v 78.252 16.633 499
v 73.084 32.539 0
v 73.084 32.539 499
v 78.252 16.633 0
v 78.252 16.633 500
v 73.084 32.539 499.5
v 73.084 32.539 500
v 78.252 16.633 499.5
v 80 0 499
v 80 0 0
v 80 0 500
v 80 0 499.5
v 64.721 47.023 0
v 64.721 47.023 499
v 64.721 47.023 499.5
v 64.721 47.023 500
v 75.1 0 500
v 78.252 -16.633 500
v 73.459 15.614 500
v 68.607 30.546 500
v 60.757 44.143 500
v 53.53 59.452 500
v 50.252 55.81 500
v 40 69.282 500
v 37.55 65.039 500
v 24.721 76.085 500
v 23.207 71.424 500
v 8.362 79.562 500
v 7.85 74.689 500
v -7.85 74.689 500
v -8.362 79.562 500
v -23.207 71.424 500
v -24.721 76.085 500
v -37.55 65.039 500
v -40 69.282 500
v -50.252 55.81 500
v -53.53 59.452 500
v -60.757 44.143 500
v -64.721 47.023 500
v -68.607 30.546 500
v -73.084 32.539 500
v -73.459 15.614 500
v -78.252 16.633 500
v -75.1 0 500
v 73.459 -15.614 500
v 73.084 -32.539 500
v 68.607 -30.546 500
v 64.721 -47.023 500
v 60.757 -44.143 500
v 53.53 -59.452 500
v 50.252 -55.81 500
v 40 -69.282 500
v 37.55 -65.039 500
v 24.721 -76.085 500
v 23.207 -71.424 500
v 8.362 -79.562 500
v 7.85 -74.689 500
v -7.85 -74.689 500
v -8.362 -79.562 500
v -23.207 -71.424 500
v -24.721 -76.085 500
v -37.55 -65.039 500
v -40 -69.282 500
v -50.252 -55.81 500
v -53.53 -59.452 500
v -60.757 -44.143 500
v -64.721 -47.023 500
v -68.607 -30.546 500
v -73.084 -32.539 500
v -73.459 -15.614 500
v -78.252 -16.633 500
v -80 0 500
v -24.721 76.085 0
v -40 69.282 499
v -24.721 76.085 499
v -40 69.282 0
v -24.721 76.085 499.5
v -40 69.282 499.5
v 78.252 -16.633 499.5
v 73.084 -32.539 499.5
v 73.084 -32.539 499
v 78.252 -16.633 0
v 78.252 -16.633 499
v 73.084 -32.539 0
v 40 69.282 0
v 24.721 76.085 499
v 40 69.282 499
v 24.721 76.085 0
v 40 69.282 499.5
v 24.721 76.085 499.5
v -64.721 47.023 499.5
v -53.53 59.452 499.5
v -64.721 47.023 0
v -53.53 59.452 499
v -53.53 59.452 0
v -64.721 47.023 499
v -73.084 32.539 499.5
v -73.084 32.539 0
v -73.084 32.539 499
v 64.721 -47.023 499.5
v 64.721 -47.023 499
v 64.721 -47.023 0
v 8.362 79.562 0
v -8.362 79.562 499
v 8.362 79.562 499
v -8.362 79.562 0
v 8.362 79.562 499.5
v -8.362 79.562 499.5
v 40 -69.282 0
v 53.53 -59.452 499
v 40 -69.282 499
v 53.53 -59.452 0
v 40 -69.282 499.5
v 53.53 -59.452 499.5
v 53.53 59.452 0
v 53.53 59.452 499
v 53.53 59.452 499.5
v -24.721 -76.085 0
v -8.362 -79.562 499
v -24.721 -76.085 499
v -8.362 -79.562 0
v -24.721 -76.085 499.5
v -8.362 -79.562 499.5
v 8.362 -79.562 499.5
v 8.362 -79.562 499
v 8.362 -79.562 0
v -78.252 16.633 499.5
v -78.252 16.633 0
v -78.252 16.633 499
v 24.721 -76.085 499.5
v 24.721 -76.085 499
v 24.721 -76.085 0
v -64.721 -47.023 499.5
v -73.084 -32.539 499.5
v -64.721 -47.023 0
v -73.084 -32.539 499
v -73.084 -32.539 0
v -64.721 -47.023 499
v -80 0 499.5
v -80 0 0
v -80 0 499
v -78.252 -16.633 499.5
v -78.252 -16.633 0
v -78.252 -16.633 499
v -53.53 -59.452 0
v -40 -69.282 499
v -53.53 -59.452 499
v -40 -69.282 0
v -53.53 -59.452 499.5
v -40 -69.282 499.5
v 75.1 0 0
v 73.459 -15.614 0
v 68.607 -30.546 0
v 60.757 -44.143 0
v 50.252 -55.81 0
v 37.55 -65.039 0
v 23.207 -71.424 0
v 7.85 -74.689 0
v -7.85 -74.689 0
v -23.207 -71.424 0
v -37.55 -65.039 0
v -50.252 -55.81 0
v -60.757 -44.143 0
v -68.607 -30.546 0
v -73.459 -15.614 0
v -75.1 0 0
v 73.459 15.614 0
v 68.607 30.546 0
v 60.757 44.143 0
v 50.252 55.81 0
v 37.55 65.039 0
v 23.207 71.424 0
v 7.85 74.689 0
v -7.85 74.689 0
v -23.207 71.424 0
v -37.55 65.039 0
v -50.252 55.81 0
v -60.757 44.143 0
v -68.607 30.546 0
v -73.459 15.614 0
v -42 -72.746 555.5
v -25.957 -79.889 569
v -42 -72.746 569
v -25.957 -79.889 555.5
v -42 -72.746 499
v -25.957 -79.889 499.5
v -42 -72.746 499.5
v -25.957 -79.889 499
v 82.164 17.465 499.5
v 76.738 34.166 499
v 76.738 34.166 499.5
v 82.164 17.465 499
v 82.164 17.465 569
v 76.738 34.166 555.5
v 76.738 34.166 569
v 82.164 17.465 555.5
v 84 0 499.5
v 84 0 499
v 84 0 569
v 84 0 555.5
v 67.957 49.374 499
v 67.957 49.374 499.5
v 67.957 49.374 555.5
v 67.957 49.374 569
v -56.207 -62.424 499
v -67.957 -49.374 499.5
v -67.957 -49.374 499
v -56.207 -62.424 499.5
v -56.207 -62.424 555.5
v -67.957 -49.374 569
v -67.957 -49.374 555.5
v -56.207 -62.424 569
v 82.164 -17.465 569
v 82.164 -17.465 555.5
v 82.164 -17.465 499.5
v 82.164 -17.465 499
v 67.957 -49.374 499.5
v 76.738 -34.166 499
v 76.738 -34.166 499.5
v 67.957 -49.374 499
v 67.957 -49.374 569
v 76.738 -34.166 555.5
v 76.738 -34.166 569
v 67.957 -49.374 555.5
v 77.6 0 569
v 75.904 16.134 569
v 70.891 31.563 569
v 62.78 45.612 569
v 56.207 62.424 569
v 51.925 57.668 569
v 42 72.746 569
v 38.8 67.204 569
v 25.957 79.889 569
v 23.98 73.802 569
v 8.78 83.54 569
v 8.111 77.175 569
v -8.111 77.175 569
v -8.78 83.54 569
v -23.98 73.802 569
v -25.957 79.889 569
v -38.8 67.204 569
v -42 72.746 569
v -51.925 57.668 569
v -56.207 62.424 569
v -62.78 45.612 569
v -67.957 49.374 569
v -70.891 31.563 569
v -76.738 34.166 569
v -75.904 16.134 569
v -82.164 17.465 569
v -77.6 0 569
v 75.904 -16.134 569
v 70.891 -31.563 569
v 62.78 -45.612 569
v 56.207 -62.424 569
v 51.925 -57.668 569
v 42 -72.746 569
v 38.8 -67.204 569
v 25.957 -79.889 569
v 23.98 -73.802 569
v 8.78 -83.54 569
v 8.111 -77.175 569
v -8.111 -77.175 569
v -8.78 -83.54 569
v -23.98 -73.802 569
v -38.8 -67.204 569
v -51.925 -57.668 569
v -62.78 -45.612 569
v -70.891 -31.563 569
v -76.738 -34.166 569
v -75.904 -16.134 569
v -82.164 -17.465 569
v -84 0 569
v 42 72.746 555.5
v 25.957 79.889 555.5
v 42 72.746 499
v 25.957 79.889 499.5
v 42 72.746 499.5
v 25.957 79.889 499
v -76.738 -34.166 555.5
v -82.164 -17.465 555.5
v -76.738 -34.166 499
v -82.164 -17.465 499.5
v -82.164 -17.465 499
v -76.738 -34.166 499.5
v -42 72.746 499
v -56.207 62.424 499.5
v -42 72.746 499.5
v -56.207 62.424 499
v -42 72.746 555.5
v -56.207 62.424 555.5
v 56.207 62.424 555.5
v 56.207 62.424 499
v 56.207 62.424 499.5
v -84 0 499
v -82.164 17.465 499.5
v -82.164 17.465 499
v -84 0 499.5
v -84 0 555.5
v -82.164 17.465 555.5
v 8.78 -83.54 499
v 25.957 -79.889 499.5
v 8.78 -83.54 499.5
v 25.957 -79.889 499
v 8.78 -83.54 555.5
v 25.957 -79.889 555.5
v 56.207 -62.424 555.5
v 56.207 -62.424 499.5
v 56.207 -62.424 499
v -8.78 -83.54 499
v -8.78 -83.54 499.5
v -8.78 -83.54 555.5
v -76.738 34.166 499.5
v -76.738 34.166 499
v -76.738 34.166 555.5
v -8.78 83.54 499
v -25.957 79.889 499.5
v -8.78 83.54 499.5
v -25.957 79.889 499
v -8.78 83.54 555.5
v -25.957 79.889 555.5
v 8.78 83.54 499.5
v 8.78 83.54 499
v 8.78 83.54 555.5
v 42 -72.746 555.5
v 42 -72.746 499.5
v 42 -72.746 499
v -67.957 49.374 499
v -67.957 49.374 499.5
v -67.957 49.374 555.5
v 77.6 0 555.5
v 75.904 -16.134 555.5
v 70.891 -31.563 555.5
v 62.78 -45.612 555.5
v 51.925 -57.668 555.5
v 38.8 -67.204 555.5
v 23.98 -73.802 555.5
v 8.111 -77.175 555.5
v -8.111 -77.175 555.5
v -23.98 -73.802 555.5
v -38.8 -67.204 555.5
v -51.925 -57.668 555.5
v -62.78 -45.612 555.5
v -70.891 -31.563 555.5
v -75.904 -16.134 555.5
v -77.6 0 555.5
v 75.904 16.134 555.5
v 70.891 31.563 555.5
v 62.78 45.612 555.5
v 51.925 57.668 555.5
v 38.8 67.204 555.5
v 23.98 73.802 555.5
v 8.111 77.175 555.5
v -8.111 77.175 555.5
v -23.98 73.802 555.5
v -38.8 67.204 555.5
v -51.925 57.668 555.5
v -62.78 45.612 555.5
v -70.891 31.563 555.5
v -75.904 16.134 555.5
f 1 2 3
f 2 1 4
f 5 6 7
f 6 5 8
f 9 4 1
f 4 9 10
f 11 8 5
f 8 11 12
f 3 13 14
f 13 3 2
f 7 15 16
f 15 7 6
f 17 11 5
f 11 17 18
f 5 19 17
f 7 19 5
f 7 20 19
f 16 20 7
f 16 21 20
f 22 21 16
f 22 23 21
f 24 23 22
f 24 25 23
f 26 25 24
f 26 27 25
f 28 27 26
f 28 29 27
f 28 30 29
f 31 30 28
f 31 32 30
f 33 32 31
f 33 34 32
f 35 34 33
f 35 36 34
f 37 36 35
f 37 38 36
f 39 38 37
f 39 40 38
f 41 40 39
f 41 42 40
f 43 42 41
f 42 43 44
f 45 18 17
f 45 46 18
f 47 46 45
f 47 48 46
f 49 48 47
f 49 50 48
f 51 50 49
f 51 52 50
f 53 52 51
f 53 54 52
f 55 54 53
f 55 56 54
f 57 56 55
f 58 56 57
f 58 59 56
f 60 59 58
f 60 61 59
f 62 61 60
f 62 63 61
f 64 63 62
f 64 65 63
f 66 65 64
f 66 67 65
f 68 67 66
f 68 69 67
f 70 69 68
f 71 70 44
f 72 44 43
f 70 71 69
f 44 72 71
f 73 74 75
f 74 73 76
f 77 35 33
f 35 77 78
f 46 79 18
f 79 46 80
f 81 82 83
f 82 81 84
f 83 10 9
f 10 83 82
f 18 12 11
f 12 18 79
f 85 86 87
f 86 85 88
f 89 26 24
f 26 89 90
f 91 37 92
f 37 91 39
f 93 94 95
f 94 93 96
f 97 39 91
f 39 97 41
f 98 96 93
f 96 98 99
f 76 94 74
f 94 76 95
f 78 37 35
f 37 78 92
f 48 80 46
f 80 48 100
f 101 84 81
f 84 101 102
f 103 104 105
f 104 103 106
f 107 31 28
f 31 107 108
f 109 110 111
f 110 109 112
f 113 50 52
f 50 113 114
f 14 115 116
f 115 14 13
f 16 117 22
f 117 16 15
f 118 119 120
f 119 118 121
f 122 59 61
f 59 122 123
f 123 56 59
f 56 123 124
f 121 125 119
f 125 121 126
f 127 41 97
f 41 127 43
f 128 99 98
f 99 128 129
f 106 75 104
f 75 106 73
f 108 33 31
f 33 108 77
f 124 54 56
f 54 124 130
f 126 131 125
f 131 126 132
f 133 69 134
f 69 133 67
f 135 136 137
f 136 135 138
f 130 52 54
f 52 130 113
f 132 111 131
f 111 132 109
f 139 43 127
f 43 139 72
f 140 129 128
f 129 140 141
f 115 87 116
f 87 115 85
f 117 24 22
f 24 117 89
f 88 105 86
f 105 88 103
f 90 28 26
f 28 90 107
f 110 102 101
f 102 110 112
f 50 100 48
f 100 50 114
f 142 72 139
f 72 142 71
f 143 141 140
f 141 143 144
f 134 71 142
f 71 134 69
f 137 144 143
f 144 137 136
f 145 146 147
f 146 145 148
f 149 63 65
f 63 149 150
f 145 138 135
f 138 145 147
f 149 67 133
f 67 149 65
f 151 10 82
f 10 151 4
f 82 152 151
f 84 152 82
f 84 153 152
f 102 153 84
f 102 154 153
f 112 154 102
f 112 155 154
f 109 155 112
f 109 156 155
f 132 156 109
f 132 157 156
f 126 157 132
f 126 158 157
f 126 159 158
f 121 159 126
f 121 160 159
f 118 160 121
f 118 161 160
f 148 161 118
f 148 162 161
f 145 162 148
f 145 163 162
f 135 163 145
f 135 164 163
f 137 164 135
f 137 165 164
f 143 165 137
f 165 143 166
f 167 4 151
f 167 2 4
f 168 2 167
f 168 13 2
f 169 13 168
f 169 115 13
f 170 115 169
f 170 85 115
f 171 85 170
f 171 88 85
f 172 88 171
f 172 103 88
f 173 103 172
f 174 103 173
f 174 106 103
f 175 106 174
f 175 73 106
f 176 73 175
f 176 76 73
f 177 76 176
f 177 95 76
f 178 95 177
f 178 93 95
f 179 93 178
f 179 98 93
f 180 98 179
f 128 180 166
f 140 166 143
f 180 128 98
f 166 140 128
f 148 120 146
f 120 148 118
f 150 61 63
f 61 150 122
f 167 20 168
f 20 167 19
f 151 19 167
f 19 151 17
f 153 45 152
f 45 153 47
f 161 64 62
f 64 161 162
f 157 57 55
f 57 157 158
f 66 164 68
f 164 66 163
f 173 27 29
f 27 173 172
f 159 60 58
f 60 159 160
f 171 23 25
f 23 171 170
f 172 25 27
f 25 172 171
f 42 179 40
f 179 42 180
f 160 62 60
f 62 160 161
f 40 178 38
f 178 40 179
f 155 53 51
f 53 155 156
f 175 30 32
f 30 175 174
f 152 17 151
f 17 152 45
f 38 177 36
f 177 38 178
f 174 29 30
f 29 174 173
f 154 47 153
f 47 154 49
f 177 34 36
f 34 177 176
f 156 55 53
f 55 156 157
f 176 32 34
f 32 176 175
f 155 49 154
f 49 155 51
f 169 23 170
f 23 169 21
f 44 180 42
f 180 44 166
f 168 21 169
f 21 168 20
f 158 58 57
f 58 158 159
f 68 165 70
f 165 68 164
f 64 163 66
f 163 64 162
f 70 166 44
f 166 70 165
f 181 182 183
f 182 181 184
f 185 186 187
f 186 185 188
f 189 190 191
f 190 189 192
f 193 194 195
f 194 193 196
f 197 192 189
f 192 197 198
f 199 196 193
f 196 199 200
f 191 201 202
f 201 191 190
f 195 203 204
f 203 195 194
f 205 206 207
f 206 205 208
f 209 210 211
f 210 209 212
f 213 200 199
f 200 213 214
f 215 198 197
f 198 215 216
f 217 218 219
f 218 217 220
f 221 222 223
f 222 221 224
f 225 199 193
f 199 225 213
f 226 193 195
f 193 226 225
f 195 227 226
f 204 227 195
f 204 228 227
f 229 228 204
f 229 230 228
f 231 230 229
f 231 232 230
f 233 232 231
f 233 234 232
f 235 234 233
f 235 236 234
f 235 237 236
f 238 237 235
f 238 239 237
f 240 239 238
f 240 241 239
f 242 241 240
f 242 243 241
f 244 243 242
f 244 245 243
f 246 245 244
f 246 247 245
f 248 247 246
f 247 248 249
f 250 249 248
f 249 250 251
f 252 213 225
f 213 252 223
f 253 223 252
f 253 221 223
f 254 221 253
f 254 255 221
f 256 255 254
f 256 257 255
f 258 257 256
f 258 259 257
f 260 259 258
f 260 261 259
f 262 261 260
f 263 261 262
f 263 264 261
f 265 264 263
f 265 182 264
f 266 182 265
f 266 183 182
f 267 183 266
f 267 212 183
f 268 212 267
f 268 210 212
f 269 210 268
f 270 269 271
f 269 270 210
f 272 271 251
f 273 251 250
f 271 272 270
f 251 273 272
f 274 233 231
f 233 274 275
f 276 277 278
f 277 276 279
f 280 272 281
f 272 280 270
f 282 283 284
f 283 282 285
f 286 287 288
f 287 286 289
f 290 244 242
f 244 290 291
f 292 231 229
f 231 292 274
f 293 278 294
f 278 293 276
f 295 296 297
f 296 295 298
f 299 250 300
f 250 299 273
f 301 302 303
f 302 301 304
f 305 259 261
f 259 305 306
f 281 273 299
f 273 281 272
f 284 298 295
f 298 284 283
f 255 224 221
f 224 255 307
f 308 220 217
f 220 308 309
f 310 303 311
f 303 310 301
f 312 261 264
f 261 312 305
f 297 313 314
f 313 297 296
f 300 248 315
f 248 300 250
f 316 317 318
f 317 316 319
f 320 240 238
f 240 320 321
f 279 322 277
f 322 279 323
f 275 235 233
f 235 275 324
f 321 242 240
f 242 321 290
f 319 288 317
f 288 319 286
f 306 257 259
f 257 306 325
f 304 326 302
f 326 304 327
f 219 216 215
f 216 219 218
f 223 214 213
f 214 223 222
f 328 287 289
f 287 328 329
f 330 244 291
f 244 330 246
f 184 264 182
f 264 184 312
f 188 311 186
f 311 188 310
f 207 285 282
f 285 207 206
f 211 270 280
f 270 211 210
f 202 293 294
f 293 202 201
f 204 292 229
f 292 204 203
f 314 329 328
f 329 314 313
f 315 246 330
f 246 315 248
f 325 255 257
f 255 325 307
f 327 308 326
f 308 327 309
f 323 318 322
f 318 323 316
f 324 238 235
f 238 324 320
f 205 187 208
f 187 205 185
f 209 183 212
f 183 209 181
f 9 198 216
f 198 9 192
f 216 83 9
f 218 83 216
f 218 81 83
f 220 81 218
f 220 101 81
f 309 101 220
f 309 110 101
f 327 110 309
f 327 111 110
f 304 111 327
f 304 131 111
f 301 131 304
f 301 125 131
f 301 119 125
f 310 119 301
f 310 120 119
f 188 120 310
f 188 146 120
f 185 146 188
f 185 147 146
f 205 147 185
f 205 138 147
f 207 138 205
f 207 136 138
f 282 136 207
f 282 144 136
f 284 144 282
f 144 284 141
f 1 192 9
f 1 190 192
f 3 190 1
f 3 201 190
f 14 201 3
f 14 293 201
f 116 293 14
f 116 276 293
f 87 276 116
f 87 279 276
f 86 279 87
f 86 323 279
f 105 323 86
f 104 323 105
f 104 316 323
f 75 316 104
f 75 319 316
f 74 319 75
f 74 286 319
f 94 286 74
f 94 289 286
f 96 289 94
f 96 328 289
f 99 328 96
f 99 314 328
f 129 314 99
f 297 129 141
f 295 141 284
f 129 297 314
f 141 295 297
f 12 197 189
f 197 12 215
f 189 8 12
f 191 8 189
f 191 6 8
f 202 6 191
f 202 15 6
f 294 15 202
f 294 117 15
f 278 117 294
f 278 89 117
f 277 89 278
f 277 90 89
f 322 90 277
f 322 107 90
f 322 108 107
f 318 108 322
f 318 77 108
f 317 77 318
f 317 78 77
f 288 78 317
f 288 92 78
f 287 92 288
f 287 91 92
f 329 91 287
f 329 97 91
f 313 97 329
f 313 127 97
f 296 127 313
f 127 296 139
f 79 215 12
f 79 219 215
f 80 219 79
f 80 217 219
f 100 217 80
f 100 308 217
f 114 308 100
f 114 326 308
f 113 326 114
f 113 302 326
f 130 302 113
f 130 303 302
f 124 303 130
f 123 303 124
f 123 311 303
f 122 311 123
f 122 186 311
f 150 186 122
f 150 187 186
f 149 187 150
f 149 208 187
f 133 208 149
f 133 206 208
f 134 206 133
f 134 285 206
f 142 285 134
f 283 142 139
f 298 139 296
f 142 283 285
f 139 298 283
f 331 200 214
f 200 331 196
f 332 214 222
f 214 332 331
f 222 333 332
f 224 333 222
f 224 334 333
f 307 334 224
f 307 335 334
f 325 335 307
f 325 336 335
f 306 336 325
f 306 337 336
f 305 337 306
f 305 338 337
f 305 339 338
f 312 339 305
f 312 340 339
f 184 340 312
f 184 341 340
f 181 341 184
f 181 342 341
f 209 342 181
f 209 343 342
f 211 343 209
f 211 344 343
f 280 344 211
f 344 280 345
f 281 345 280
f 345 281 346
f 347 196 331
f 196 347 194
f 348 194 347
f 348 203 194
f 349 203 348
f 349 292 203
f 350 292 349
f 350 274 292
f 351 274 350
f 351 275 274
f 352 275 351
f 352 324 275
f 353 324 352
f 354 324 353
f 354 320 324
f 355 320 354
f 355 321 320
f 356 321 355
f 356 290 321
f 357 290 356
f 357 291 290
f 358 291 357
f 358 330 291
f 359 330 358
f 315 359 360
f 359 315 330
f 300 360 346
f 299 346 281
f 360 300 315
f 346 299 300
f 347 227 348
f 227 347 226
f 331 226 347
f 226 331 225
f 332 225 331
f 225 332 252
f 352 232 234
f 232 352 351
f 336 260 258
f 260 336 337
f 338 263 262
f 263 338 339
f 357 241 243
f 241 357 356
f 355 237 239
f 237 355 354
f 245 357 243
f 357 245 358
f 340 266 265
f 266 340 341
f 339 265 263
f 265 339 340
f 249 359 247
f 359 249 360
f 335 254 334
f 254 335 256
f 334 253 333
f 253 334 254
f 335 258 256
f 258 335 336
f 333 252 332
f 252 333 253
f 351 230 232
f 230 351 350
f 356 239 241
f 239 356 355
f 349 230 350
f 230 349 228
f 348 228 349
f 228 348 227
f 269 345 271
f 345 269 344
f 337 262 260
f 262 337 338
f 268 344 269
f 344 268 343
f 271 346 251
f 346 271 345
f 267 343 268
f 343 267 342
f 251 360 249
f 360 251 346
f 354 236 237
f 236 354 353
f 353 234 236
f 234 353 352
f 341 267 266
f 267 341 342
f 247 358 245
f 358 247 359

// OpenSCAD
// Parameters
pipe_standard = 1; //[1:1:1]
nominal_diameter_mm = 160; //[80:320:1]
length_mm = 500; //[250:1000:1]
include_end_fitting = 1; //[0:1:1]
wall_thickness_mm = 4.9; //[2.5:10:0.1]
od_mm = 160; //[80:320:1]
fit_length_mm = 70; //[35:140:1]
fit_od_extra_mm = 8; //[3:20:0.5]
fit_wall_extra_mm = 1.5; //[0.5:4:0.1]
socket_depth_mm = 55; //[25:110:1]
overlap_mm = 1; //[0.5:2:0.1]

// HT Pipe - complete geometry
module ht_pipe() {
  color([0.85, 0.85, 0.8]) {
    // Pipe body
    difference() {
      cylinder(h=length_mm, r=od_mm/2, center=false);
      translate([0, 0, -overlap_mm/2])
        cylinder(h=length_mm + overlap_mm, r=od_mm/2 - wall_thickness_mm, center=false);
    }
    
    // End fitting
    if (include_end_fitting) {
      difference() {
        translate([0, 0, length_mm - overlap_mm])
          cylinder(h=fit_length_mm, r=(od_mm + fit_od_extra_mm)/2, center=false);
        translate([0, 0, length_mm - overlap_mm/2])
          cylinder(h=socket_depth_mm + overlap_mm, r=od_mm/2 + wall_thickness_mm, center=false);
        translate([0, 0, length_mm - overlap_mm])
          cylinder(h=fit_length_mm + overlap_mm, r=(od_mm + fit_od_extra_mm)/2 - (wall_thickness_mm + fit_wall_extra_mm), center=false);
      }
    }
  }
}

// Assembly
module assembly() {
  ht_pipe();
}

assembly();
